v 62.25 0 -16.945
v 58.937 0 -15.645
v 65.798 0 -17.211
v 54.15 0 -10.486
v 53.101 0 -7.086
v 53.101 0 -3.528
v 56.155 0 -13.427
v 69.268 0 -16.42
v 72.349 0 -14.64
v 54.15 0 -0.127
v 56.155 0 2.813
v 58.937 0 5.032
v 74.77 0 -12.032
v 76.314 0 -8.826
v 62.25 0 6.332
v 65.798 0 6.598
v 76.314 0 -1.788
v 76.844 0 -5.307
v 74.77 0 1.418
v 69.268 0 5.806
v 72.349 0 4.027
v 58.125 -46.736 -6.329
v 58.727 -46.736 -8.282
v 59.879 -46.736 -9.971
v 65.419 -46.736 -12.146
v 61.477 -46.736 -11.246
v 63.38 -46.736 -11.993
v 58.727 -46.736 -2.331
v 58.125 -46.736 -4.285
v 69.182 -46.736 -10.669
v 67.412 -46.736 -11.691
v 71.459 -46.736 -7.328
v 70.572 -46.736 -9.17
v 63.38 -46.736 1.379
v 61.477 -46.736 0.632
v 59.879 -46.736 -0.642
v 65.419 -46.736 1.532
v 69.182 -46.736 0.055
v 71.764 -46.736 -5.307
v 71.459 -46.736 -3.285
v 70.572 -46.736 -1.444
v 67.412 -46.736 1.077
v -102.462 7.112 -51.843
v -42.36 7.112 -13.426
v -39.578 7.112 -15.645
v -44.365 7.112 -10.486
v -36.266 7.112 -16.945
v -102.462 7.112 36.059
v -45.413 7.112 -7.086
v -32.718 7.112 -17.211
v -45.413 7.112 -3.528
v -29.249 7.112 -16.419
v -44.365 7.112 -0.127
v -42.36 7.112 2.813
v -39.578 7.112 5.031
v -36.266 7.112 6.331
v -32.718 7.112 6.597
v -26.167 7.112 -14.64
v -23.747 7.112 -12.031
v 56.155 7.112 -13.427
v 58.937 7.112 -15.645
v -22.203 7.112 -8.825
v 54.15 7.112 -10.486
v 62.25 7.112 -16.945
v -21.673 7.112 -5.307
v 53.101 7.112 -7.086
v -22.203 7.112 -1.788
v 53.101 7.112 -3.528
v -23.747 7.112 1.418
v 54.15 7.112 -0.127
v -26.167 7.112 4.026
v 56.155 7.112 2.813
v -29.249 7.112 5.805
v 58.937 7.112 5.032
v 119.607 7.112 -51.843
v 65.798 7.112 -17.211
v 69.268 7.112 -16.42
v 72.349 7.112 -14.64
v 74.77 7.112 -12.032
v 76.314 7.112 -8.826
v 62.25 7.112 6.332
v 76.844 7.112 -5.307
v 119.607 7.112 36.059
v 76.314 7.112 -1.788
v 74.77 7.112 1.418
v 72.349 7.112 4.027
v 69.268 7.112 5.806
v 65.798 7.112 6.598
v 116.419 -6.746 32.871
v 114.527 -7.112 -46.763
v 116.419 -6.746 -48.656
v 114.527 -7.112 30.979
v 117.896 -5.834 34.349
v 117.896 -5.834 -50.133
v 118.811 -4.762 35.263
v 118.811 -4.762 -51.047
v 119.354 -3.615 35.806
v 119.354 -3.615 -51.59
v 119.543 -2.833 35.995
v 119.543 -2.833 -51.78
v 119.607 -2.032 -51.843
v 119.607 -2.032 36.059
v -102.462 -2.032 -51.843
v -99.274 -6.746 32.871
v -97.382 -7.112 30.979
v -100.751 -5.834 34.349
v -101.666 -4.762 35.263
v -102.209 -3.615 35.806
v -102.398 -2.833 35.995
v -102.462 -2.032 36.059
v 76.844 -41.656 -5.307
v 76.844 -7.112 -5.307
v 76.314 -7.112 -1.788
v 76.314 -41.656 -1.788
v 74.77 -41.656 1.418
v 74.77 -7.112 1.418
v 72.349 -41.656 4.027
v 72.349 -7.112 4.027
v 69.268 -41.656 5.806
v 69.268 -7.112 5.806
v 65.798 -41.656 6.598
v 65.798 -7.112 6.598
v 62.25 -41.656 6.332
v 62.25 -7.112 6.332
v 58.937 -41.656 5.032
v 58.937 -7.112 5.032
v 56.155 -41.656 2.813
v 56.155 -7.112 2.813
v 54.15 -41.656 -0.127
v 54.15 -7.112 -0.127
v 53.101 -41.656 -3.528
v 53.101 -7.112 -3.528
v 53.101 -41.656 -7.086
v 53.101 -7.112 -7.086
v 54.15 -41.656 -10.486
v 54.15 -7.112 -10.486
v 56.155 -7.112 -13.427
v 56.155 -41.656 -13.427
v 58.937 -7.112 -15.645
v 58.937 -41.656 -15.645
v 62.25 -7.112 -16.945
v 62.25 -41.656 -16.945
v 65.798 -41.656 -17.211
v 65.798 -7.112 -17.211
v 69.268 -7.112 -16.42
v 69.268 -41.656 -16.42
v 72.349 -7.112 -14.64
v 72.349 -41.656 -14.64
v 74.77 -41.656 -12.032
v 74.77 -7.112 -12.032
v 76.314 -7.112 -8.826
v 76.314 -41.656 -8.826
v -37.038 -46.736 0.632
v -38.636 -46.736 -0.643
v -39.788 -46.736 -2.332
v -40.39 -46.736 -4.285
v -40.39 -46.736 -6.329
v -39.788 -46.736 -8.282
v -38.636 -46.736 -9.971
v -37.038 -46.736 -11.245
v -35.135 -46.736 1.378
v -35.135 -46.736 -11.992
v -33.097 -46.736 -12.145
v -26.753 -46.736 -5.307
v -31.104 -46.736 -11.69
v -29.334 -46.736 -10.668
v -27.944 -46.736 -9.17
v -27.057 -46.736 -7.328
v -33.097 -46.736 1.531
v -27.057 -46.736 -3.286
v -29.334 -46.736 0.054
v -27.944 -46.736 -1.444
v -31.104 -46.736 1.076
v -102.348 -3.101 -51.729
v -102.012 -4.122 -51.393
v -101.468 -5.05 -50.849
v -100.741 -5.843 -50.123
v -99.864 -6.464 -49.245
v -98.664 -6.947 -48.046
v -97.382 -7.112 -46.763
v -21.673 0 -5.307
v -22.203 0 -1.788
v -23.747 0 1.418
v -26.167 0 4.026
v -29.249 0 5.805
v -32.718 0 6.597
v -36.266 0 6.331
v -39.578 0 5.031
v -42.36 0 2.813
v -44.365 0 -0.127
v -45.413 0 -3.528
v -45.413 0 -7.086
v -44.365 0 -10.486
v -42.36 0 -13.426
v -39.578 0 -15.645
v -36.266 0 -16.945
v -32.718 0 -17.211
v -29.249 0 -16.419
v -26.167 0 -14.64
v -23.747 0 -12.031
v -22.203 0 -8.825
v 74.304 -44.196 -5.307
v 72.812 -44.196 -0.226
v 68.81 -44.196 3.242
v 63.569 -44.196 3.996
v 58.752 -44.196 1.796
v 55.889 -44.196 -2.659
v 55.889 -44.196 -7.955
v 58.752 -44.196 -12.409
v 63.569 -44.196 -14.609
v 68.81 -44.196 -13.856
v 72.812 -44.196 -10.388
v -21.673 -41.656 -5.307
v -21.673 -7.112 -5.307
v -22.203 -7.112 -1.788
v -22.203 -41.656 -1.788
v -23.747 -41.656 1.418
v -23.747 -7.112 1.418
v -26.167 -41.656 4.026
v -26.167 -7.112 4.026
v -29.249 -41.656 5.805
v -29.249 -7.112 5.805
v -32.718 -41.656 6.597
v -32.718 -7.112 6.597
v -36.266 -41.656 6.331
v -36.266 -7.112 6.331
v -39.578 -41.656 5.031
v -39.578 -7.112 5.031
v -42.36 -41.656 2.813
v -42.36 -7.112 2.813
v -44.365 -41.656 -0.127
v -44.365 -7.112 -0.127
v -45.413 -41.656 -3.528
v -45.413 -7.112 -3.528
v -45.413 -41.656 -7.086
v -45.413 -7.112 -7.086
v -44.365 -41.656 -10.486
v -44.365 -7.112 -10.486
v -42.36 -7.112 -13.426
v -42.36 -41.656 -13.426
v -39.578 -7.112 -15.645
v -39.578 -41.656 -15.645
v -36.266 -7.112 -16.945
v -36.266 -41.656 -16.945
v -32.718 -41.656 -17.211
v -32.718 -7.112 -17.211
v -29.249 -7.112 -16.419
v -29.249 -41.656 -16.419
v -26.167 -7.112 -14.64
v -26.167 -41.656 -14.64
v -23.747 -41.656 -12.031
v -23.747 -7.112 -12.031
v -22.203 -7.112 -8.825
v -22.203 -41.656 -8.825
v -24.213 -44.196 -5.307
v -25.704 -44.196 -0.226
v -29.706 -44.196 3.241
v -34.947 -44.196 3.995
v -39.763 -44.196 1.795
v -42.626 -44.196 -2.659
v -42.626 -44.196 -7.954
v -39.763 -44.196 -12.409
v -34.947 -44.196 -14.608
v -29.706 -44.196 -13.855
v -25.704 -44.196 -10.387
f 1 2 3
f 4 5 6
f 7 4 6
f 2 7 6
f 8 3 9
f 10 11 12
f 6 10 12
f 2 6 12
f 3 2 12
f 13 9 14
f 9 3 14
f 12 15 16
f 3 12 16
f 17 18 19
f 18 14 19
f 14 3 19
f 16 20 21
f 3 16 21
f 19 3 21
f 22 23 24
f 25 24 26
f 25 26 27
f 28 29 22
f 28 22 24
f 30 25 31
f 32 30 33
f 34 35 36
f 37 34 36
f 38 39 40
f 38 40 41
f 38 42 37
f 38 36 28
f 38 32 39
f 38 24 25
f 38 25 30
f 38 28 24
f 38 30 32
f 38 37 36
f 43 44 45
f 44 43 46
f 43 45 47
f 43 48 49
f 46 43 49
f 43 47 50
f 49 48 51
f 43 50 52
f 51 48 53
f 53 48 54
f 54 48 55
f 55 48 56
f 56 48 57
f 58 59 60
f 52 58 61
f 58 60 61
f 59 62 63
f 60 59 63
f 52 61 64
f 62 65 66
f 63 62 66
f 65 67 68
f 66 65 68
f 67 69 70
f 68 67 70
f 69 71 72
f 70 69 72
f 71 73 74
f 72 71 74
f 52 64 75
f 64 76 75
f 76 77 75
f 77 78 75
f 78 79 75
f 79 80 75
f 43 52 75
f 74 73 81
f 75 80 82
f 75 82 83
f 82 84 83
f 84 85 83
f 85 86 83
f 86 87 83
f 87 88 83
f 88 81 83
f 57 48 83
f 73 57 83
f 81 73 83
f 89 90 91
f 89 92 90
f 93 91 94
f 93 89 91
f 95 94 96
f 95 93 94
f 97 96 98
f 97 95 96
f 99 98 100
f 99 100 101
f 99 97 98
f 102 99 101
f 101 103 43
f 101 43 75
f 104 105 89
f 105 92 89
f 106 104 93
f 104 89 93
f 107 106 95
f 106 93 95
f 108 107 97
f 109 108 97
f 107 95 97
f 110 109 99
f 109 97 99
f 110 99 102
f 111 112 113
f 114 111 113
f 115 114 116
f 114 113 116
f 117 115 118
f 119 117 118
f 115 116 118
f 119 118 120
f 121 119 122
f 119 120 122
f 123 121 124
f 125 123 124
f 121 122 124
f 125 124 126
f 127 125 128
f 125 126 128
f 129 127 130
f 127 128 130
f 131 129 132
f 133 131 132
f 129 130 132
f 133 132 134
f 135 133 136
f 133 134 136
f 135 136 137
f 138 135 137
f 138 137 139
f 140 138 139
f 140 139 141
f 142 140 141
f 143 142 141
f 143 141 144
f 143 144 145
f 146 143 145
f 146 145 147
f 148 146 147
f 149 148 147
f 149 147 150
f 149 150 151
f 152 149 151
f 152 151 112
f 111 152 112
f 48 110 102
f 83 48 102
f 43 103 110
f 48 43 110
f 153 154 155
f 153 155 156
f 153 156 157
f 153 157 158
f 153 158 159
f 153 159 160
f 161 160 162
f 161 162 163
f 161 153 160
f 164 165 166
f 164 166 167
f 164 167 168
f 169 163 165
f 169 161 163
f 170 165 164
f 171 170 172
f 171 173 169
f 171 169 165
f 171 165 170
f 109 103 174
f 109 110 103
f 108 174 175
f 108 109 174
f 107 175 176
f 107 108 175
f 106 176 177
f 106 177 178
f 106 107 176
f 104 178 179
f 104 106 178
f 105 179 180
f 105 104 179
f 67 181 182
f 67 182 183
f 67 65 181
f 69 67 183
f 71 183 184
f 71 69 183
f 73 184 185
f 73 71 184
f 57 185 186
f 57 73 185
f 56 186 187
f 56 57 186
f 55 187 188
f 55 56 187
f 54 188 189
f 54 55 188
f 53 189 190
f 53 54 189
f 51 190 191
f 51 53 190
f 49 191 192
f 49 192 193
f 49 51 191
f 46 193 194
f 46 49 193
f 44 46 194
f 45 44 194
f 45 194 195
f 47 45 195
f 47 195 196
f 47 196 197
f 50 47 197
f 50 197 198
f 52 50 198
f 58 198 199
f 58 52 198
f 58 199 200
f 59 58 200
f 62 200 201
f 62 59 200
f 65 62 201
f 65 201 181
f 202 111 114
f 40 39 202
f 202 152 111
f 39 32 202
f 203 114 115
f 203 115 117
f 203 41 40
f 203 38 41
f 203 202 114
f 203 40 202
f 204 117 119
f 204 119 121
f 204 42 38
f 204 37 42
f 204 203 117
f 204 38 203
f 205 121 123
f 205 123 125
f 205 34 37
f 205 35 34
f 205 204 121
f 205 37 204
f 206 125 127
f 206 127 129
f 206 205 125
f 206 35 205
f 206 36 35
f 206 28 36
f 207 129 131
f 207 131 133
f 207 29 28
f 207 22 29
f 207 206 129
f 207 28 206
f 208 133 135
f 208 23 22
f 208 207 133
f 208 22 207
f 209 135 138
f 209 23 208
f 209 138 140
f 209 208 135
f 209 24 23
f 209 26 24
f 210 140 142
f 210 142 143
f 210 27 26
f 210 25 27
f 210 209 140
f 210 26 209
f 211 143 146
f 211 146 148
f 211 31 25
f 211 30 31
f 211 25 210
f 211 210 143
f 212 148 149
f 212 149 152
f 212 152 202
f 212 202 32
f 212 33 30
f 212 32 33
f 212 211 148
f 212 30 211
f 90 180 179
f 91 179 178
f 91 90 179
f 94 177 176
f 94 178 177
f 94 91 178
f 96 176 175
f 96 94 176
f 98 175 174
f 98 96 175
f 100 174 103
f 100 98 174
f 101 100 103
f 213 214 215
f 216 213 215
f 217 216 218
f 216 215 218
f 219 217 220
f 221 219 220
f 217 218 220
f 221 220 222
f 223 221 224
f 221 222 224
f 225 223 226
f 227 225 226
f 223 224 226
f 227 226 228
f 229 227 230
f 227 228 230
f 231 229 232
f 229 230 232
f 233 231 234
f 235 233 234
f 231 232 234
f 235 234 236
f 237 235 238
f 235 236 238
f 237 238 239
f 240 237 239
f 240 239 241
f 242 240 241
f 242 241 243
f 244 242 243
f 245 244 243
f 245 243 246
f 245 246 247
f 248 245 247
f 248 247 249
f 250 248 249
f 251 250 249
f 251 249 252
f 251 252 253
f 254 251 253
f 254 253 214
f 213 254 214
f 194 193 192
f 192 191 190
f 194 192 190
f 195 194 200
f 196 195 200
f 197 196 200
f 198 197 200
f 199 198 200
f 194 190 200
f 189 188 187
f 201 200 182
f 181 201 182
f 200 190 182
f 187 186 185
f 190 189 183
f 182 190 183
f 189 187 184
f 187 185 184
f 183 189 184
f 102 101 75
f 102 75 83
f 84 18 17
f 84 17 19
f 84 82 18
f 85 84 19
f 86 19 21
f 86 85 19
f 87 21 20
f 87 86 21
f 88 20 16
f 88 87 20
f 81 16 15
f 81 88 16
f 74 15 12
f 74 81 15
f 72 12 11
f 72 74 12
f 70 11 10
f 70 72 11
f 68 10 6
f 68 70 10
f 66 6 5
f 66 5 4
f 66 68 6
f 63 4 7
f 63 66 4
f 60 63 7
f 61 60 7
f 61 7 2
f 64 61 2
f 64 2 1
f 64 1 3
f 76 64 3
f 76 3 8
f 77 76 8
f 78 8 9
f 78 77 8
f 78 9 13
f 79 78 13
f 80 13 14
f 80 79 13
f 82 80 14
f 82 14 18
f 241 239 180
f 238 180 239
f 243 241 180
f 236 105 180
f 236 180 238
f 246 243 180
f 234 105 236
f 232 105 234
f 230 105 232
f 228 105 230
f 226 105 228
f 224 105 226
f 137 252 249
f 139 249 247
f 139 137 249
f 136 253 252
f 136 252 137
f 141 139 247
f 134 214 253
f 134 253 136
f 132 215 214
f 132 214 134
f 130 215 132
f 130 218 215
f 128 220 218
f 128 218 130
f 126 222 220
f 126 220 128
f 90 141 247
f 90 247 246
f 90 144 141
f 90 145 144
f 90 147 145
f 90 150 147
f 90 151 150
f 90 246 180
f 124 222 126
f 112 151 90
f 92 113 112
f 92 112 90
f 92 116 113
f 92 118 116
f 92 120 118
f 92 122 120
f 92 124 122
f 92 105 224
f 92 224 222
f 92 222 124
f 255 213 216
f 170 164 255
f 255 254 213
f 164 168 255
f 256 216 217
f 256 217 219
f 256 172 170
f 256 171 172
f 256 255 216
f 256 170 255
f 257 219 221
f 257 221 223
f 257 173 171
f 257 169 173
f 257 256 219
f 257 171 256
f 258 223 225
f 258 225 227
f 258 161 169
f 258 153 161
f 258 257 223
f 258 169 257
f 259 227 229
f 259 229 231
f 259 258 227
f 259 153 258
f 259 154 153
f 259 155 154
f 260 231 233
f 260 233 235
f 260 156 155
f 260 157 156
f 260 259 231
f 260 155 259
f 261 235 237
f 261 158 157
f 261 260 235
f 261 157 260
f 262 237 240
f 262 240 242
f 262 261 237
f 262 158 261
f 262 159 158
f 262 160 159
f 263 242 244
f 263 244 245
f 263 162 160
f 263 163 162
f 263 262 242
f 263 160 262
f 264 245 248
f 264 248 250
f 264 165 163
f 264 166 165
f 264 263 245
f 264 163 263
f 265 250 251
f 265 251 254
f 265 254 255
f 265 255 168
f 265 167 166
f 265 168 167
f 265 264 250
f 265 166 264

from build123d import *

# Parameters (mm, degrees)
F0_W     = 222.068578
F0_H     = 87.902144
F0_R     = 11.937119
F0_R_2   = 11.938
F1_DEPTH = 7.112
F2_R     = 5.08
F3_DEPTH = 46.736
F4_SIZE  = 5.08


with BuildPart() as f1:
    # F0 (on Front) → F1 (new body, symmetric)
    with BuildSketch(Plane.XZ):
        with Locations((8.572504, -7.892143)):
            Rectangle(F0_W, F0_H)
        with Locations((-33.609644, -5.306785)):
            Circle(F0_R, mode=Mode.SUBTRACT)
        with Locations((64.906068, -5.306785)):
            Circle(F0_R_2, mode=Mode.SUBTRACT)
    extrude(amount=F1_DEPTH, both=True)

    # F2
    f2_edges = [f1.edges().sort_by_distance(p)[0] for p in [
        (8.572504, -7.112, 36.058929),
        (-102.461785, -7.112, -7.892143),
        (8.572504, -7.112, -51.843215),
        (119.606793, -7.112, -7.892143),
    ]]
    fillet(f2_edges, radius=F2_R)

    # F0 (on Front) → F3 (join)
    with BuildSketch(Plane.XZ):
        with Locations((64.906068, -5.306785)):
            Circle(F0_R_2)
        with Locations((-33.609644, -5.306785)):
            Circle(F0_R)
    extrude(amount=F3_DEPTH)

    # F4
    f4_edges = [f1.edges().sort_by_distance(p)[0] for p in [
        (-45.546762, -46.736, -5.306785),
        (52.968068, -46.736, -5.306785),
    ]]
    chamfer(f4_edges, length=F4_SIZE)


solid = f1.part
